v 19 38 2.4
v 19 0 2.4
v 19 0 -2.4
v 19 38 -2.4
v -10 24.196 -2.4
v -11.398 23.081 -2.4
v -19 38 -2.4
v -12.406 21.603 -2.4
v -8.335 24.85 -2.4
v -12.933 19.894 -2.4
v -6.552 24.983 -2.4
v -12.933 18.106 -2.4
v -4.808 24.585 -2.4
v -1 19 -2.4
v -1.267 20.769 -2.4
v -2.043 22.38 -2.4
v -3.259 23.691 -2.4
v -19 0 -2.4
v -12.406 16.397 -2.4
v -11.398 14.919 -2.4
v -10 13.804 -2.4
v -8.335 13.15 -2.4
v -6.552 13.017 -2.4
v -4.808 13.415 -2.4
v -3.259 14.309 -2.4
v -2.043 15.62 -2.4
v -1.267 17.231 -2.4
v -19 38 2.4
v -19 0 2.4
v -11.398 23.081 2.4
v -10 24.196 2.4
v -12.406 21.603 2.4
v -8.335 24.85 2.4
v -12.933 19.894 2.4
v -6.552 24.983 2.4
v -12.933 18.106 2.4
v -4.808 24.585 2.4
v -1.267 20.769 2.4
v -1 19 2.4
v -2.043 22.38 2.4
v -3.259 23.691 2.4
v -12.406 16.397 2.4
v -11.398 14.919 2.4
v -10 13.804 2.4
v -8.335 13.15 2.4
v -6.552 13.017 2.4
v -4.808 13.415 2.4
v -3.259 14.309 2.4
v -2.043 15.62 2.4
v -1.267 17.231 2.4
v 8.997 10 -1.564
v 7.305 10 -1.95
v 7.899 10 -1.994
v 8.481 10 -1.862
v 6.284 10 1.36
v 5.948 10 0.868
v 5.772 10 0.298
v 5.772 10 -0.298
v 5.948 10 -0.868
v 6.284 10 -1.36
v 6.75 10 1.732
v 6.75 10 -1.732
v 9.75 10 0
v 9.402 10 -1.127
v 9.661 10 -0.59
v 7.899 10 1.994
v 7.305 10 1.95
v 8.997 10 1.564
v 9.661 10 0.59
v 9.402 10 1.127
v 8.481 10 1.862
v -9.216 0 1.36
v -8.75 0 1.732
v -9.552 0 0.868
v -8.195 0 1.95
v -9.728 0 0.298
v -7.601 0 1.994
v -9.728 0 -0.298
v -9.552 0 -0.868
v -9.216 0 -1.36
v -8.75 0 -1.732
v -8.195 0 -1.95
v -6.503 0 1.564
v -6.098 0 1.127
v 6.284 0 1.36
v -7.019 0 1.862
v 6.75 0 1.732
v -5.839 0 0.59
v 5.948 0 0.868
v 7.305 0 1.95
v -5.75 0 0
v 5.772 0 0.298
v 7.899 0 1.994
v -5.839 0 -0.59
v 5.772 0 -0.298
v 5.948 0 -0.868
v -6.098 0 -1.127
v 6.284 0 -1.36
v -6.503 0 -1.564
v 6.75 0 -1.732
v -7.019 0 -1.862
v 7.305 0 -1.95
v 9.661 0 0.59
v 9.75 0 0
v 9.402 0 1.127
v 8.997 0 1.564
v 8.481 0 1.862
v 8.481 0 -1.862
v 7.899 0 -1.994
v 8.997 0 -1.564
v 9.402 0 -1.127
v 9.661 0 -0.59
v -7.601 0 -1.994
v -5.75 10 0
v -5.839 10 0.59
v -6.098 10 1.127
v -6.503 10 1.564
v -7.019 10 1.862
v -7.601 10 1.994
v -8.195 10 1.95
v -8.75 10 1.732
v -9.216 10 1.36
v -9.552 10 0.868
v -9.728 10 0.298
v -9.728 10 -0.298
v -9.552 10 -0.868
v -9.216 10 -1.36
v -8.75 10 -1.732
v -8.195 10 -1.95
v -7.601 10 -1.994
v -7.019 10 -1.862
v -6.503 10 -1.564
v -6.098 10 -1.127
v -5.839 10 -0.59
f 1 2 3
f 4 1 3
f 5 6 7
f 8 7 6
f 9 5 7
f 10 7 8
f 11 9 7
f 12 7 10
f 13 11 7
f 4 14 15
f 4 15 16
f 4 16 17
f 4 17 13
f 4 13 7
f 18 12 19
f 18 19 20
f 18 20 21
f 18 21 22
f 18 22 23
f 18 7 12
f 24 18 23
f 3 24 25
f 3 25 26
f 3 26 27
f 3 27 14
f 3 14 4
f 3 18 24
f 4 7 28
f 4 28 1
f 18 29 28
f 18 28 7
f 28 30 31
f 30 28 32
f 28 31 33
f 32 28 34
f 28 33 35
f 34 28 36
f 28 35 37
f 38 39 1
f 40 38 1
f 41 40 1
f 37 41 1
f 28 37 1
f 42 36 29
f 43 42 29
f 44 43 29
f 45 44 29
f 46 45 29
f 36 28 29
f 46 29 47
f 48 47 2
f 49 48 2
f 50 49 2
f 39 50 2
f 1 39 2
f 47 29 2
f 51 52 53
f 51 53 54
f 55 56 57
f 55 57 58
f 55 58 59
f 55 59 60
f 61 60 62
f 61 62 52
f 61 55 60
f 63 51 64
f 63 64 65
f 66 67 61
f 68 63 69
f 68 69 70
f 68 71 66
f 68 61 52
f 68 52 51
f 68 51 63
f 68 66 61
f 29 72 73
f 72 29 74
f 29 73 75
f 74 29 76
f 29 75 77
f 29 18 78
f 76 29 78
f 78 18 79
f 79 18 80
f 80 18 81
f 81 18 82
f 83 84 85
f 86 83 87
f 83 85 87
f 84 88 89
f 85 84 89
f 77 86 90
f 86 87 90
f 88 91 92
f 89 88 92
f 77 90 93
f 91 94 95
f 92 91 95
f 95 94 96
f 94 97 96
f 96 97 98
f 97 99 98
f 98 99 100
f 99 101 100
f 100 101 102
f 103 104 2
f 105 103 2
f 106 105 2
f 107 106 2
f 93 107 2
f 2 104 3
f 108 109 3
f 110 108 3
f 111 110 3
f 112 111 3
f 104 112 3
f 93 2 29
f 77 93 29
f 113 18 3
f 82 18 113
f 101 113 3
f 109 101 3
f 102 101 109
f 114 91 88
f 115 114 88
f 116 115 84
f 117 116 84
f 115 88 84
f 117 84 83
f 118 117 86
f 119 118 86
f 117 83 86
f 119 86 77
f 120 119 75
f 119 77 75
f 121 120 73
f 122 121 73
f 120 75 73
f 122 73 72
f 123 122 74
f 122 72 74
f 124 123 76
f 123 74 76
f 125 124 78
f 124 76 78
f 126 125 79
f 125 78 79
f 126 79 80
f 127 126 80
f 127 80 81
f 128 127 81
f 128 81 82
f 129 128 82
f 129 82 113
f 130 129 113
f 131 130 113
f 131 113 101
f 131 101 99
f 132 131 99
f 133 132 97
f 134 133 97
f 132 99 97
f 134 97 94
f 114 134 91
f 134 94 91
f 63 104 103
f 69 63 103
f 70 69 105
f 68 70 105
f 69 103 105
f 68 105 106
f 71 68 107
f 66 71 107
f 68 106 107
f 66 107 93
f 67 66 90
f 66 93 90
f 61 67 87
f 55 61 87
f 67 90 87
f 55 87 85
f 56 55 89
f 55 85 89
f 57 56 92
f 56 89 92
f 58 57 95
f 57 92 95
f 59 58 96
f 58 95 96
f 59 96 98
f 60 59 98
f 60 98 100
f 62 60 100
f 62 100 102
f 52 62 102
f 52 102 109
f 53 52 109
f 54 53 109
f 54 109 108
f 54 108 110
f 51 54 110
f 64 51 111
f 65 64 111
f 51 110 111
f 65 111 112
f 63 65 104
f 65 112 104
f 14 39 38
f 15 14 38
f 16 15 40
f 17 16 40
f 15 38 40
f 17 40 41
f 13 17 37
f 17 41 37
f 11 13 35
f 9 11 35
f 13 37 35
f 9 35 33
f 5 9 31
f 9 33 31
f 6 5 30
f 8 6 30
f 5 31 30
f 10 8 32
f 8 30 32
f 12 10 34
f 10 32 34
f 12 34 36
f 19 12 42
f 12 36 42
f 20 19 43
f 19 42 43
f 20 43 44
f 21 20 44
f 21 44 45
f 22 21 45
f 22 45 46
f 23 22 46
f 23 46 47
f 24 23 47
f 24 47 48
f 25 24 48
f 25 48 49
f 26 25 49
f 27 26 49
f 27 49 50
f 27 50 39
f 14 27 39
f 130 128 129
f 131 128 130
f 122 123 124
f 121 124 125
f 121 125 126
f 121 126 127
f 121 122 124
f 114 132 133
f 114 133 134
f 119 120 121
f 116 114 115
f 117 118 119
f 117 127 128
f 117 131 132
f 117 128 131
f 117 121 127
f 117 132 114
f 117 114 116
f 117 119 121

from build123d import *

# Parameters (mm, degrees)
SKETCH1_W           = 38
SKETCH1_H           = 4.8
BOSS_EXTRUDE1_DEPTH = 38
SKETCH2_R           = 2
CUT_EXTRUDE1_DEPTH  = 10
SKETCH3_R           = 6
CUT_EXTRUDE2_DEPTH  = 5.8


with BuildPart() as part:
    # Sketch1 → Boss-Extrude1 (new body)
    with BuildSketch(Plane(origin=(0, 0, 0), x_dir=(1, 0, 0), z_dir=(0, 1, 0))):
        Rectangle(SKETCH1_W, SKETCH1_H)
    extrude(amount=BOSS_EXTRUDE1_DEPTH)

    # Sketch2 → Cut-Extrude1 (cut)
    with BuildSketch(Plane.XZ):
        with Locations((7.75, 0)):
            Circle(SKETCH2_R)
        with Locations((-7.75, 0)):
            Circle(SKETCH2_R)
    extrude(amount=-CUT_EXTRUDE1_DEPTH, mode=Mode.SUBTRACT)

    # Sketch3 → Cut-Extrude2 (cut, through all)
    with BuildSketch(Plane.XY.offset(2.4)):
        with Locations((-7, 19)):
            Circle(SKETCH3_R)
    extrude(amount=-CUT_EXTRUDE2_DEPTH, mode=Mode.SUBTRACT)


solid = part.part
